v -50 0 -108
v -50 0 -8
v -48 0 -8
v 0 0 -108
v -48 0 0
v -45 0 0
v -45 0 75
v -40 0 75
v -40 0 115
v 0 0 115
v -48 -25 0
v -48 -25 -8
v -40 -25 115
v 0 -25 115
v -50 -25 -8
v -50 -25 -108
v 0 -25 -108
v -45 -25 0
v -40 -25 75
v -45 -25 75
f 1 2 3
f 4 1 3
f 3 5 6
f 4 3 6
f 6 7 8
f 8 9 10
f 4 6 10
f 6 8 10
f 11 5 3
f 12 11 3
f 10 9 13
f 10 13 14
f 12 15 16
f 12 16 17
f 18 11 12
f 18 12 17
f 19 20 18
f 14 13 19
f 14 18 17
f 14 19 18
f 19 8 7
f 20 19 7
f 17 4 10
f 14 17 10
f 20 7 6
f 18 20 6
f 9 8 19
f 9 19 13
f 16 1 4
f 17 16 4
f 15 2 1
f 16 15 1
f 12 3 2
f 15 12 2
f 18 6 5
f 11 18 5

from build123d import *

# Parameters (mm, degrees)
F0_W     = 40
F0_H     = 40
F1_DEPTH = 25


with BuildPart() as f1:
    # F0 (on Front) → F1 (new body)
    with BuildSketch(Plane.XZ):
        Polygon((-40, 75), (-45, 75), (-45, 0), (0, 0), (0, 75), align=None)
        with Locations((-20, 95)):
            Rectangle(F0_W, F0_H)
        Polygon((0, 0), (-45, 0), (-48, 0), (-48, -8), (0, -8), align=None)
        Polygon((0, -108), (0, -8), (-48, -8), (-50, -8), (-50, -108), align=None)
    extrude(amount=F1_DEPTH)


solid = f1.part
